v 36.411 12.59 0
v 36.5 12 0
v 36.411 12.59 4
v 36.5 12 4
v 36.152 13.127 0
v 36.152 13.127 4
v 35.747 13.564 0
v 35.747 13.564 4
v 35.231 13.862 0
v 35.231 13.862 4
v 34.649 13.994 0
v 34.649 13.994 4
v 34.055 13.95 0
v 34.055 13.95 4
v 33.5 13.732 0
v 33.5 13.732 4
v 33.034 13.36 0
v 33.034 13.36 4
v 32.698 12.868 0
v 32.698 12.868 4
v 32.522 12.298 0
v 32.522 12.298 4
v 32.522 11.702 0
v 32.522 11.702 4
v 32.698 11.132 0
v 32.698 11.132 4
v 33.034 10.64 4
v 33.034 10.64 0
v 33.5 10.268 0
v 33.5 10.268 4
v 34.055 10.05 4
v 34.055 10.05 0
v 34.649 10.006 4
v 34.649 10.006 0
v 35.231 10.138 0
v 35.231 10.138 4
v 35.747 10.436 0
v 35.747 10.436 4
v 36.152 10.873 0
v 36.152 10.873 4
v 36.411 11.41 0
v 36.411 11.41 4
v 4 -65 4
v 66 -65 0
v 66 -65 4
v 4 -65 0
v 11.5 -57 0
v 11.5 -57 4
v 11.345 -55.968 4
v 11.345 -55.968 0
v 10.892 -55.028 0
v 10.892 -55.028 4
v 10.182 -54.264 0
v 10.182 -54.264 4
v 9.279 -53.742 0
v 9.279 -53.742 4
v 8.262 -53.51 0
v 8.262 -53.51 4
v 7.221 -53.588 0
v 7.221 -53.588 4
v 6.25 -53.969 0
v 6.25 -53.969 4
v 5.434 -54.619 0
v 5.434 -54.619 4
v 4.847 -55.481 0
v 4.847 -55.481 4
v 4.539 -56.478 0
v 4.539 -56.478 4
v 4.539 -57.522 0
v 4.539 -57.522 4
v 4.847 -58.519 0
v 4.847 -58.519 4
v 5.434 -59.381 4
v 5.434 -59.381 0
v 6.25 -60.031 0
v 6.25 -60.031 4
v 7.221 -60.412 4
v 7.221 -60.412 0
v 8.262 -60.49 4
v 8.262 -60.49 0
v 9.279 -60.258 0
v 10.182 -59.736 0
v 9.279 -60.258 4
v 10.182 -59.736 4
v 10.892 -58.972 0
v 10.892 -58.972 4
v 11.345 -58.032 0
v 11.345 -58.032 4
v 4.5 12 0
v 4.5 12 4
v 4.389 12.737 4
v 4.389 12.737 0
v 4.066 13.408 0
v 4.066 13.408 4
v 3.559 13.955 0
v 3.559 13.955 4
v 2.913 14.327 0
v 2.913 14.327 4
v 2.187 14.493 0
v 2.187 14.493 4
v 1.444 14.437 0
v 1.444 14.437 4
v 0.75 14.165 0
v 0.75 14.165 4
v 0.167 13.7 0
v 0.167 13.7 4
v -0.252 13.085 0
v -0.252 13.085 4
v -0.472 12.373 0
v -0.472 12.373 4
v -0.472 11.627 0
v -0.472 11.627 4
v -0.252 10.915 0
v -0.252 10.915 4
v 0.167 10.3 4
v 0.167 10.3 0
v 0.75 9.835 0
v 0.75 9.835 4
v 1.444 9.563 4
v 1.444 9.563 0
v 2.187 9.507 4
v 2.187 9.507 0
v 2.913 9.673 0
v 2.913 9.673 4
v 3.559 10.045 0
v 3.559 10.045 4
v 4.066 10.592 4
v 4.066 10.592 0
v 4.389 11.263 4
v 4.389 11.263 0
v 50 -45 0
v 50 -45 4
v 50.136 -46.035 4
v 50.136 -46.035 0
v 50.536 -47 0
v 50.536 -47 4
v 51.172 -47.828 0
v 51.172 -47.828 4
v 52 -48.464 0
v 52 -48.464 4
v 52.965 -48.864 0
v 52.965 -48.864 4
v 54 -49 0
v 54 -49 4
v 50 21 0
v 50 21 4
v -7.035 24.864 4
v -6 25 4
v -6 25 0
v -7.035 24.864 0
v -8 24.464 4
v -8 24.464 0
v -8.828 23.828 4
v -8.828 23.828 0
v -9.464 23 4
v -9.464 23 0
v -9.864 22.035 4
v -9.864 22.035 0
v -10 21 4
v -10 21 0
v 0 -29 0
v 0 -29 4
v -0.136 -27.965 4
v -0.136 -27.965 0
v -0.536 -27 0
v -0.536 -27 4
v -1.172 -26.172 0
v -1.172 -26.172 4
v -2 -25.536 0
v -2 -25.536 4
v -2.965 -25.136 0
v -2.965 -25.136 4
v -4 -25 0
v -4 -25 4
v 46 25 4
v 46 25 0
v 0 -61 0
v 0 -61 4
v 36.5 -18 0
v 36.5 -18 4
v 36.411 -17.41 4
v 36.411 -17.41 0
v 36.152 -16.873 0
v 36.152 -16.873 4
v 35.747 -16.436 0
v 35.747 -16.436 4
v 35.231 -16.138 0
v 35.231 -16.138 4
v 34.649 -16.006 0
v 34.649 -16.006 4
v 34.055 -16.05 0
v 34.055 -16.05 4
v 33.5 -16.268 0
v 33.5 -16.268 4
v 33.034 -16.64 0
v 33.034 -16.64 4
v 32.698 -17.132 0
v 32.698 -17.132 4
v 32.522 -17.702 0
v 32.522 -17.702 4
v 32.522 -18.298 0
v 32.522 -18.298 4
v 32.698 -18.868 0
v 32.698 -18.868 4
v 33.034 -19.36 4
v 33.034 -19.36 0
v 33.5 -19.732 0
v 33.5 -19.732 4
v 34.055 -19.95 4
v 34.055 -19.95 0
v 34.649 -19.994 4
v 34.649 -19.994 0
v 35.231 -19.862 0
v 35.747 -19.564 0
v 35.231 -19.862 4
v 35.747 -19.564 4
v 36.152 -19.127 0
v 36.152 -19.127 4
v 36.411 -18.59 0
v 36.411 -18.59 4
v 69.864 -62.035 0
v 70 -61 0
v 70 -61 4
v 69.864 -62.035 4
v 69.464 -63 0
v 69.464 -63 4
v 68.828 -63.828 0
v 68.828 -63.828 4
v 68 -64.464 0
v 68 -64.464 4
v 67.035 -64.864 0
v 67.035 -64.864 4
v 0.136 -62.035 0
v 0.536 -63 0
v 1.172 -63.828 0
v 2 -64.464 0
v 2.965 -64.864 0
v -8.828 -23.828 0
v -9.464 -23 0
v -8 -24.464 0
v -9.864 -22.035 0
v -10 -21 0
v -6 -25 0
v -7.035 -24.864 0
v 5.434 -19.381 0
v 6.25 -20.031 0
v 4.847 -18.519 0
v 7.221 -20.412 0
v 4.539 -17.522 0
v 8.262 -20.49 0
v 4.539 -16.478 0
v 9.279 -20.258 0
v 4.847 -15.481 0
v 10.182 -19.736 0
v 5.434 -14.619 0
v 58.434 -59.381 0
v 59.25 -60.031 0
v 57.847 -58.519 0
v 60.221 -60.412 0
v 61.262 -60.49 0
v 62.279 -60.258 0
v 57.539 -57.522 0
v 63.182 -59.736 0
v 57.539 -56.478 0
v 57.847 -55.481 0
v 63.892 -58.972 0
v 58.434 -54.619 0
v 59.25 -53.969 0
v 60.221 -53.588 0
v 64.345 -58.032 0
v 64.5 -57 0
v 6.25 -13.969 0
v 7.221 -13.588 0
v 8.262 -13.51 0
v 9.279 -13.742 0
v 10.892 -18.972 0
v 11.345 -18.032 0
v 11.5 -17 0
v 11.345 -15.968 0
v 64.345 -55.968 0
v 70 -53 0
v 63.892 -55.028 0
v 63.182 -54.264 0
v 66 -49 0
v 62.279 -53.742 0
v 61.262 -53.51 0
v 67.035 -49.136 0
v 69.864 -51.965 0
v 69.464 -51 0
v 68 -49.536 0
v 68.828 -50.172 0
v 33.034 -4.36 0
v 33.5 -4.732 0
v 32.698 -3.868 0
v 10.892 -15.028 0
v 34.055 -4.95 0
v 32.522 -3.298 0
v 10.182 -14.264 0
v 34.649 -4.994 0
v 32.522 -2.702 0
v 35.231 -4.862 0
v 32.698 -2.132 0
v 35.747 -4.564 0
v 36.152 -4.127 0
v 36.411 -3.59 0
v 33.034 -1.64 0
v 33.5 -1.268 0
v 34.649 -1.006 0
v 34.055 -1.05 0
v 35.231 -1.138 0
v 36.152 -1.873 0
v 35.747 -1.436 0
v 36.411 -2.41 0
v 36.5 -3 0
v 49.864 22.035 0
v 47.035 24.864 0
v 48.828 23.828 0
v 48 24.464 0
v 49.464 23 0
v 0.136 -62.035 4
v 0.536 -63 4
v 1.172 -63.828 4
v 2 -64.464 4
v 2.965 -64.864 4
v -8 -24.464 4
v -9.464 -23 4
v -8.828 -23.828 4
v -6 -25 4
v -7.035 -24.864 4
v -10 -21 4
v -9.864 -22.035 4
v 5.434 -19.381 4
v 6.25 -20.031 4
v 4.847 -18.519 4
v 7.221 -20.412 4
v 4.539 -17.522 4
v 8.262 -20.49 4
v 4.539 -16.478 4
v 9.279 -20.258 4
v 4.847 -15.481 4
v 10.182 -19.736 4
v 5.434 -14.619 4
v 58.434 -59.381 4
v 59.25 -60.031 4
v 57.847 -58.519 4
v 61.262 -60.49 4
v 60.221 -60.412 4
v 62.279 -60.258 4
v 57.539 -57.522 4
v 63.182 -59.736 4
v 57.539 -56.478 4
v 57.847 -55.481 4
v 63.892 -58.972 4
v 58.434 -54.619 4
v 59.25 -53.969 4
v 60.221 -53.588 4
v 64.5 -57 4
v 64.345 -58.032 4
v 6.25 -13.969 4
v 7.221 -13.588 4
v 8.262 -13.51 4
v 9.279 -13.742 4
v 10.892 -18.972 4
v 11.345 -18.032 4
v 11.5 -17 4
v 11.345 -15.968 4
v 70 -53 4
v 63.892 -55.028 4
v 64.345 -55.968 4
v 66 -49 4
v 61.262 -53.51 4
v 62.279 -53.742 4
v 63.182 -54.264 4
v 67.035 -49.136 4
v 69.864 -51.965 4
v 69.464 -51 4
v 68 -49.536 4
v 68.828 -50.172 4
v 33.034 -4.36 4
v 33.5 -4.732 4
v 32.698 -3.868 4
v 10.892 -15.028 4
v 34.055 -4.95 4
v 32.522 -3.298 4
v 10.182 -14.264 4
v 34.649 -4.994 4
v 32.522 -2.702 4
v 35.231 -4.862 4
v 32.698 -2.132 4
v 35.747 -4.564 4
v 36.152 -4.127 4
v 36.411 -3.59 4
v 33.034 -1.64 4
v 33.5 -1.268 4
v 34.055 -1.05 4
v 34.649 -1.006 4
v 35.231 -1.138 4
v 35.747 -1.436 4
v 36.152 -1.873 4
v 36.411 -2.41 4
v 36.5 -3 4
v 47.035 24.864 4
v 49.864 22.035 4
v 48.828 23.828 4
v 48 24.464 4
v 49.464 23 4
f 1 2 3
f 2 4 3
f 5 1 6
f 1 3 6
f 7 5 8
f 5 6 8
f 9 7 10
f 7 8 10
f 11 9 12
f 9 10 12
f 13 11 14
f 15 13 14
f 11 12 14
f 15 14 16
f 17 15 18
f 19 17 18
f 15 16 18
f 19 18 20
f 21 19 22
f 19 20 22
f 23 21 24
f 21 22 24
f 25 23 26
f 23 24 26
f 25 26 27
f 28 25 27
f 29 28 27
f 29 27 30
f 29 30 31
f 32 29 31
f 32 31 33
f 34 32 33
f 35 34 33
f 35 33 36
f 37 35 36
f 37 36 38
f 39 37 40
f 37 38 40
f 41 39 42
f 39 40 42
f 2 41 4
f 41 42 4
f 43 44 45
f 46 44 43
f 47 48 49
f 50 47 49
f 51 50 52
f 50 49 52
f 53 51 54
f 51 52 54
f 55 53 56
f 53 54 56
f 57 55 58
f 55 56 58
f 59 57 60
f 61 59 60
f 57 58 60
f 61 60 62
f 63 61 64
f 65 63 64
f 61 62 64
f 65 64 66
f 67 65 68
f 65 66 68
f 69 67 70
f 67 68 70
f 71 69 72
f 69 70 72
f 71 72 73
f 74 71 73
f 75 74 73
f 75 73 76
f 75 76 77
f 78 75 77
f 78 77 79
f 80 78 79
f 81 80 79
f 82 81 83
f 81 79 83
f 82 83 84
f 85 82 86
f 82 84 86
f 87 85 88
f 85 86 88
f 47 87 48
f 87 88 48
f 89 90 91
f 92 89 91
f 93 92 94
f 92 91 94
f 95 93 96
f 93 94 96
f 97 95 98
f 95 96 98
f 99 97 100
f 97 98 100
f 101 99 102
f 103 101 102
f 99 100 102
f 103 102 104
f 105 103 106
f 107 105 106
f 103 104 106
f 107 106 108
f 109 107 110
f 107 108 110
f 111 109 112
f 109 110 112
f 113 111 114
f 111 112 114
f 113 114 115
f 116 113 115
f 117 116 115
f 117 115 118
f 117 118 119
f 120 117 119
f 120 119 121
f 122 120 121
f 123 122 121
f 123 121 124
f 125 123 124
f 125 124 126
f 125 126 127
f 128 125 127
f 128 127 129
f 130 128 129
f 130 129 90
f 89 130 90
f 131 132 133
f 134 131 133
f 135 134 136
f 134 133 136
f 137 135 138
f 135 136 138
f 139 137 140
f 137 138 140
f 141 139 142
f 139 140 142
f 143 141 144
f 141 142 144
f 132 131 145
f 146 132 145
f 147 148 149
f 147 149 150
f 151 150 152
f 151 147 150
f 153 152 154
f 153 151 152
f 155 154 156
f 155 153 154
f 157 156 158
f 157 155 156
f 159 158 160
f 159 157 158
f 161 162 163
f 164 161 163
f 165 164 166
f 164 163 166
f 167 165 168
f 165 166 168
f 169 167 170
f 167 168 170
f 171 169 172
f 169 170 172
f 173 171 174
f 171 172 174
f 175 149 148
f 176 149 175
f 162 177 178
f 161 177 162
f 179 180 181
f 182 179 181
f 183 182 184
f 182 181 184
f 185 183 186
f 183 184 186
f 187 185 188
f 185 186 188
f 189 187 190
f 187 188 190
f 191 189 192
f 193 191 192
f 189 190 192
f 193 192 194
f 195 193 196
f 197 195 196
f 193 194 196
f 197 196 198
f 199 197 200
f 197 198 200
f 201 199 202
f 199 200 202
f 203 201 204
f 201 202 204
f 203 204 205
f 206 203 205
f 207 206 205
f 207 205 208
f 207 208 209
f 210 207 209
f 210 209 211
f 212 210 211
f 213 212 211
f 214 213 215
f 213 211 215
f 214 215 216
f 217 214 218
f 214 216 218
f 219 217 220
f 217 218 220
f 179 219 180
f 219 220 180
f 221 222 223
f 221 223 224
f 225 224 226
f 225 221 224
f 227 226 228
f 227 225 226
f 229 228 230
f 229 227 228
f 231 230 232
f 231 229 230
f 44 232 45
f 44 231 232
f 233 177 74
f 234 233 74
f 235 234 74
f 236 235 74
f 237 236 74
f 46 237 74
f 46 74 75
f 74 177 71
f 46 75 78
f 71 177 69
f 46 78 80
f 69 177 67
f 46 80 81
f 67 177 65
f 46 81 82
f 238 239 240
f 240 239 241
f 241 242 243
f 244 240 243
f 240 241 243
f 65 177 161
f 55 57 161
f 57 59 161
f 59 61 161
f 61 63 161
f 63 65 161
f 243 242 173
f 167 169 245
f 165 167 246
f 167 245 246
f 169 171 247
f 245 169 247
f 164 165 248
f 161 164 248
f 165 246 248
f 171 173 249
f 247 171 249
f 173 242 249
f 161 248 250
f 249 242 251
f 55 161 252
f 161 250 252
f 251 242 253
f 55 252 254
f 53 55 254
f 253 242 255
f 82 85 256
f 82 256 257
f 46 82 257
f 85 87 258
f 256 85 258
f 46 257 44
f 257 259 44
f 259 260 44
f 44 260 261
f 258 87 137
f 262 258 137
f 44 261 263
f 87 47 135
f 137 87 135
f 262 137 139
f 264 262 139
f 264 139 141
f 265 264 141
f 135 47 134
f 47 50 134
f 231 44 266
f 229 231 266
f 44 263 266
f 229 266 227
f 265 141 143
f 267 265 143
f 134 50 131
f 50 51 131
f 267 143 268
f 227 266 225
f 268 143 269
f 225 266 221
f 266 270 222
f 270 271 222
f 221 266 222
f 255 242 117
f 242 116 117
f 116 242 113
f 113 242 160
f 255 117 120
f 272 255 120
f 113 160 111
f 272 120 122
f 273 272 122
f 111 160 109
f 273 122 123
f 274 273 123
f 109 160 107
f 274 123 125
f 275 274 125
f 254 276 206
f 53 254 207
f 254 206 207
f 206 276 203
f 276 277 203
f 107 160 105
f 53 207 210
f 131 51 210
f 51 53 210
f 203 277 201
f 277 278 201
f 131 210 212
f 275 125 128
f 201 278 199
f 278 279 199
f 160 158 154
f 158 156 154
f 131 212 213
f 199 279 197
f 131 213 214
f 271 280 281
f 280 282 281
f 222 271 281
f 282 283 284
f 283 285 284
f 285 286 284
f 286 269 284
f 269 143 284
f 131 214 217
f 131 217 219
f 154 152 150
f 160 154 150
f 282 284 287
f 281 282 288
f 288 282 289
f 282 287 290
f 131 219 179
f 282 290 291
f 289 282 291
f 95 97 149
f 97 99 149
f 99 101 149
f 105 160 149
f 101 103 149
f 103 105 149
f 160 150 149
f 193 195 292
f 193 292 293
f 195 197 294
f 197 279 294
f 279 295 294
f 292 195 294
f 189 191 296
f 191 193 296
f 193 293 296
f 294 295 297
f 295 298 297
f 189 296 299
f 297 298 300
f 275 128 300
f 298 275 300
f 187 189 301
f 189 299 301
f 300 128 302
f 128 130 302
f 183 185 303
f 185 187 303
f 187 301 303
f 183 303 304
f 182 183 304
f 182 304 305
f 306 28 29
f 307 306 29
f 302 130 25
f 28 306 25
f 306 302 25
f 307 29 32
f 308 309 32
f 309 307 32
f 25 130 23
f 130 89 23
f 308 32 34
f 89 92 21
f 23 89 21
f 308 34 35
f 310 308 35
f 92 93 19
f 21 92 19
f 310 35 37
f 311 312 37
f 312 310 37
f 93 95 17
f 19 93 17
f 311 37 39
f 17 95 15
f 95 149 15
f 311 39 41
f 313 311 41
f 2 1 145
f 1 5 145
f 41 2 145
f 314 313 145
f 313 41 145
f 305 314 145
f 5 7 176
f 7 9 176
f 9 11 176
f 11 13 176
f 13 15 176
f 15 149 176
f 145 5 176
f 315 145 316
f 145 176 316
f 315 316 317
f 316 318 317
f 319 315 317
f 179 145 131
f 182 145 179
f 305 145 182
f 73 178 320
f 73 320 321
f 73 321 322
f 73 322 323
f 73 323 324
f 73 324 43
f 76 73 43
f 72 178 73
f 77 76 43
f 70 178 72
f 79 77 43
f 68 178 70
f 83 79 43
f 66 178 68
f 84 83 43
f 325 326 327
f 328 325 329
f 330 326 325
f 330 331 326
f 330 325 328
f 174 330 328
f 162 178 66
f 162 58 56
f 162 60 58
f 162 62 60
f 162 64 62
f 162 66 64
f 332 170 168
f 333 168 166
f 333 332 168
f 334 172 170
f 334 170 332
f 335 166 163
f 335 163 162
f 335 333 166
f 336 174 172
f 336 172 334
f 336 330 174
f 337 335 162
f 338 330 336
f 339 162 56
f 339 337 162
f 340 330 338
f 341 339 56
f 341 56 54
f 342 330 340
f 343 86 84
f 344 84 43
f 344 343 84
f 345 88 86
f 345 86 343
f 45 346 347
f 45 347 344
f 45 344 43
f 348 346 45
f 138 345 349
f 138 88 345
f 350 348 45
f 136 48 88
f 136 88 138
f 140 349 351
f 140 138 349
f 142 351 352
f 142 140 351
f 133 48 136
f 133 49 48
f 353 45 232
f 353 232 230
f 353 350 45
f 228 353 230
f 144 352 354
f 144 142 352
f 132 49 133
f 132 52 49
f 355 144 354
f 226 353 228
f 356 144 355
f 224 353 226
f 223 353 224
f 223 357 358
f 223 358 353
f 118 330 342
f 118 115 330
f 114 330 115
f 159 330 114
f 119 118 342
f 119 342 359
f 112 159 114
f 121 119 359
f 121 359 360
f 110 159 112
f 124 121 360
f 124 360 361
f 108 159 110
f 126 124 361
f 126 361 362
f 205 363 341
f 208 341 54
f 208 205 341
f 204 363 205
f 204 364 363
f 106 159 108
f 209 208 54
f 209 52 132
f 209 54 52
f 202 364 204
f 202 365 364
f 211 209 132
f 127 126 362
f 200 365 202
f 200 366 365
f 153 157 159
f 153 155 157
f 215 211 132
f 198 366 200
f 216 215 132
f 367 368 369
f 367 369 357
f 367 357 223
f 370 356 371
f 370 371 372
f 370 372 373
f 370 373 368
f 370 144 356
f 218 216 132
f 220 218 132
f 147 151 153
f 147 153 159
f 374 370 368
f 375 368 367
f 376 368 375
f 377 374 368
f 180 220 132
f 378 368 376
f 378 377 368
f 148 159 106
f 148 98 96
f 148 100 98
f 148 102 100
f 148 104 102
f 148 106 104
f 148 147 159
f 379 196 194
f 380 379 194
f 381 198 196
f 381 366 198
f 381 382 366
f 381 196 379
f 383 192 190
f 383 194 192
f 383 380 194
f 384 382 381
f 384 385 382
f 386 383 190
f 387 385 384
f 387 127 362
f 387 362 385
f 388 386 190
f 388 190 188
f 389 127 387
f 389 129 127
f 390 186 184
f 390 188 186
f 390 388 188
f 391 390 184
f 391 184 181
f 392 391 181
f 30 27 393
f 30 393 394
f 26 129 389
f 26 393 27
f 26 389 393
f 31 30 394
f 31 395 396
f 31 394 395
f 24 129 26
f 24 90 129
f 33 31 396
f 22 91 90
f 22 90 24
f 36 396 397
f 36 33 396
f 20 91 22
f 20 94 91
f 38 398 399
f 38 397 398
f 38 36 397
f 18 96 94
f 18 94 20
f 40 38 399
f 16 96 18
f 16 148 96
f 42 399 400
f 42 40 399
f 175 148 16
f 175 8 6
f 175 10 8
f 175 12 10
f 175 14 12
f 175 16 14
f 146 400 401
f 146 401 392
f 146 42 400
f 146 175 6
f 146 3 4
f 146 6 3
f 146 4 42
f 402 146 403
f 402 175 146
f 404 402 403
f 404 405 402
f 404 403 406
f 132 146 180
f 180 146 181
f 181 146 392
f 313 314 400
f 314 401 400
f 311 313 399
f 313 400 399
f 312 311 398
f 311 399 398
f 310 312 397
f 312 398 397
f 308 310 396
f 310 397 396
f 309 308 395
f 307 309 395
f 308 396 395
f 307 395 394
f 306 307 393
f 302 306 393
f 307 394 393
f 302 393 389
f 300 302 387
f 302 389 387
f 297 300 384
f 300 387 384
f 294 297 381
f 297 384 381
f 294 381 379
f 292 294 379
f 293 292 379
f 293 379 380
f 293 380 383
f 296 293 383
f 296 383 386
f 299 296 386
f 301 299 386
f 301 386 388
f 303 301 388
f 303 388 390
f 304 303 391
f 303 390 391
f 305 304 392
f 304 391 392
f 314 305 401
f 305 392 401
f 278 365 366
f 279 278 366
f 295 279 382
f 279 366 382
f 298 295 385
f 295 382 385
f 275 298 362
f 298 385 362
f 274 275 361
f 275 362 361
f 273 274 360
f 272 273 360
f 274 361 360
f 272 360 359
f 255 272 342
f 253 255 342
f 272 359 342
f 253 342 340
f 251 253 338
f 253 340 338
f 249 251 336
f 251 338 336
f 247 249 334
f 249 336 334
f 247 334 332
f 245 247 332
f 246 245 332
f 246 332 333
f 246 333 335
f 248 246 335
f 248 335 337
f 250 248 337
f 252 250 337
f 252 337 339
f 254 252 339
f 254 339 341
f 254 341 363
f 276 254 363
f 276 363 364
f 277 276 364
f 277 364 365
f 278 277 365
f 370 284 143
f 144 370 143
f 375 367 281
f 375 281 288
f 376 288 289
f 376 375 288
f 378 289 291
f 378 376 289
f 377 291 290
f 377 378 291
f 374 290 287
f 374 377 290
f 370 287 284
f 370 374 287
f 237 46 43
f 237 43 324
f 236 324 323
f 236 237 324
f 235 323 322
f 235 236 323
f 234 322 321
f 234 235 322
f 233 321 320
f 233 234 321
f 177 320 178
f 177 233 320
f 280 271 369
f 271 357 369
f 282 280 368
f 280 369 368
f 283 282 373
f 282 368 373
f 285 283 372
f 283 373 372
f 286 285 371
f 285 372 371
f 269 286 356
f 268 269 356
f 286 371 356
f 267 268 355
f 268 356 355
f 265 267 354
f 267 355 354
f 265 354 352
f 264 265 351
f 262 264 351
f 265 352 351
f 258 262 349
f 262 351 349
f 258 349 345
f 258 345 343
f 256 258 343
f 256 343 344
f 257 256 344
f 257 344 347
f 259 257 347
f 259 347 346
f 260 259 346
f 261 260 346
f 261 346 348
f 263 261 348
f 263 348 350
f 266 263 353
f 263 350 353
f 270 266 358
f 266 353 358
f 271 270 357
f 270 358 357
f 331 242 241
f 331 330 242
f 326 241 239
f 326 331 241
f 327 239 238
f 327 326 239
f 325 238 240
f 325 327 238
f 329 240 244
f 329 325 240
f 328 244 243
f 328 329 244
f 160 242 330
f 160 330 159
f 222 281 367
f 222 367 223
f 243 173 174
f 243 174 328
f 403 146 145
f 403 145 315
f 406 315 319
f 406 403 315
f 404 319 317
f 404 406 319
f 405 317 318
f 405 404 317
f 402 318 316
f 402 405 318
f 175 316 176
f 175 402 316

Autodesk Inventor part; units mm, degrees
ref_plane "YZ Plane" through (0, 0, 0) normal (1, 0, 0) x (0, 1, 0)
ref_plane "XZ Plane" through (0, 0, 0) normal (0, 1, 0) x (-1, 0, 0)
ref_plane "XY Plane" through (0, 0, 0) normal (0, 0, 1) x (1, 0, 0)
sketch "Эскиз1" plane through (0, 0, 0) normal (0, 0, 1) x (1, 0, 0)
  line L0 (4, 0) -> (50, 0)
  line L1 (70, -4) -> (70, -49)
  line L2 (66, -65) -> (4, -65)
  line L3 (0, -61) -> (0, -4)
  arc A0 (70, -4) -> (66, 0) centre (66, -4) ccw
  arc A1 (66, -65) -> (70, -61) centre (66, -61) ccw
  arc A2 (4, 0) -> (0, -4) centre (4, -4) ccw
  arc A3 (0, -61) -> (4, -65) centre (4, -61) ccw
  line L4 (-10, 25) -> (50, 25)
  line L5 (65, 25) -> (65, -25)
  line L6 (65, -25) -> (-10, -25)
  line L7 (-10, -25) -> (-10, 25)
  line L8 (-10, 25) -> (65, -25) construction
  line L9 (65, 25) -> (-10, -25) construction
  line L10 (70, -49) -> (50, -49)
  line L11 (50, -49) -> (50, 25)
  line L12 (70, -49) -> (70, -61)
  line L13 (65, 0) -> (66, 0)
  line L14 (50, 0) -> (65, 0)
  line L15 (50, 25) -> (65, 25)
  point P0 (0, 0)
  point P1 (70, -65)
  point P2 (70, 0)
  point P3 (27.5, 0)
  point P4 (5, 0)
  point P5 (65, 0)
  point P6 (50, -25)
  point P7 (0, -25)
  dimension "d0" = 70
  dimension "d1" = 65
  dimension "d2" = 4
  dimension "d23" = 75
  dimension "d24" = 50
  dimension "d44" = 20
  dimension "d46" = 16
  dimension "d47" = 5
  dimension "d48" = 25
extrude "Выдавливание1" add sketch "Эскиз1" along normal blind 4 contours A2 L3 L6 L7 L4 L11 L0 | L0 L11 L6 L3 A2 | L11 L10 L12 A1 L2 A3 L3 L6
sketch "Эскиз2" plane through (0, 0, 4) normal (0, 0, 1) x (1, 0, 0)
  circle A0 centre (61, -57) radius 3.5
  line L0 (4, -65) -> (66, -65) projected
  circle A1 centre (8, -57) radius 3.5
  line L1 (0, -25) -> (0, -61) projected
  circle A2 centre (61, -17) radius 3.5
  circle A3 centre (8, -17) radius 3.5
  line L2 (61, -17) -> (8, -17) construction
  line L3 (61, -17) -> (61, -57) construction
  line L4 (8, -57) -> (61, -57)
  circle A4 centre (54.5, 12) radius 2.5
  line L5 (54.5, 12) -> (54.5, -22.1685) construction
  circle A5 centre (2, 12) radius 2.5
  line L6 (70, -61) -> (70, -49) projected
  line L7 (-10, 25) -> (-10, -25) projected
  dimension "d5" = 7
  dimension "d6" = 8
  dimension "d8" = 7
  dimension "d9" = 8
  dimension "d10" = 8
  dimension "d13" = 7
  dimension "d16" = 7
  dimension "d19" = 53
  dimension "d20" = 53
  dimension "d21" = 40
  dimension "d22" = 40
  dimension "d26" = 5
  dimension "d27" = 29
  dimension "d28" = 6.5
  dimension "d29" = 5
  dimension "d43" = 29
  dimension "d51" = 12
extrude "Выдавливание2" cut sketch "Эскиз2" against normal blind 4
fillet "Сопряжение1" radius 4 1 edges at (-10, 25, 2)
sketch "Эскиз3" plane through (0, 0, 4) normal (0, 0, 1) x (1, 0, 0)
  circle A0 centre (2, 12) radius 2.5 construction
  line L0 (67, 12) -> (2, 12) construction
  line L1 (34.5, 12) -> (34.5, -39.6855) construction
  circle A1 centre (34.5, 12) radius 2
  circle A2 centre (34.5, -3) radius 2
  circle A3 centre (34.5, -18) radius 2
  line L2 (50, -49) -> (50, 25) projected
  point P0 (0, 0)
  dimension "d31" = 4
  dimension "d32" = 4
  dimension "d33" = 4
  dimension "d34" = 15
  dimension "d35" = 15
  dimension "d50" = 15.5
extrude "Выдавливание3" cut sketch "Эскиз3" against normal blind 10
fillet "Сопряжение3" radius 4 3 edges at (50, 25, 2) (50, -49, 2) (70, -49, 2)
sketch "Эскиз5" plane through (0, 0, 4) normal (0, 0, 1) x (1, 0, 0)
  circle A0 centre (79.889, -5.5) radius 8 construction
  line L0 (79.889, 2.5) -> (-3.7783, 2.5) construction
  point P0 (0, 0)
fillet "Сопряжение4" radius 4 2 edges at (0, -25, 2) (-10, -25, 2)
properties part number "креп_центр_рейки"
